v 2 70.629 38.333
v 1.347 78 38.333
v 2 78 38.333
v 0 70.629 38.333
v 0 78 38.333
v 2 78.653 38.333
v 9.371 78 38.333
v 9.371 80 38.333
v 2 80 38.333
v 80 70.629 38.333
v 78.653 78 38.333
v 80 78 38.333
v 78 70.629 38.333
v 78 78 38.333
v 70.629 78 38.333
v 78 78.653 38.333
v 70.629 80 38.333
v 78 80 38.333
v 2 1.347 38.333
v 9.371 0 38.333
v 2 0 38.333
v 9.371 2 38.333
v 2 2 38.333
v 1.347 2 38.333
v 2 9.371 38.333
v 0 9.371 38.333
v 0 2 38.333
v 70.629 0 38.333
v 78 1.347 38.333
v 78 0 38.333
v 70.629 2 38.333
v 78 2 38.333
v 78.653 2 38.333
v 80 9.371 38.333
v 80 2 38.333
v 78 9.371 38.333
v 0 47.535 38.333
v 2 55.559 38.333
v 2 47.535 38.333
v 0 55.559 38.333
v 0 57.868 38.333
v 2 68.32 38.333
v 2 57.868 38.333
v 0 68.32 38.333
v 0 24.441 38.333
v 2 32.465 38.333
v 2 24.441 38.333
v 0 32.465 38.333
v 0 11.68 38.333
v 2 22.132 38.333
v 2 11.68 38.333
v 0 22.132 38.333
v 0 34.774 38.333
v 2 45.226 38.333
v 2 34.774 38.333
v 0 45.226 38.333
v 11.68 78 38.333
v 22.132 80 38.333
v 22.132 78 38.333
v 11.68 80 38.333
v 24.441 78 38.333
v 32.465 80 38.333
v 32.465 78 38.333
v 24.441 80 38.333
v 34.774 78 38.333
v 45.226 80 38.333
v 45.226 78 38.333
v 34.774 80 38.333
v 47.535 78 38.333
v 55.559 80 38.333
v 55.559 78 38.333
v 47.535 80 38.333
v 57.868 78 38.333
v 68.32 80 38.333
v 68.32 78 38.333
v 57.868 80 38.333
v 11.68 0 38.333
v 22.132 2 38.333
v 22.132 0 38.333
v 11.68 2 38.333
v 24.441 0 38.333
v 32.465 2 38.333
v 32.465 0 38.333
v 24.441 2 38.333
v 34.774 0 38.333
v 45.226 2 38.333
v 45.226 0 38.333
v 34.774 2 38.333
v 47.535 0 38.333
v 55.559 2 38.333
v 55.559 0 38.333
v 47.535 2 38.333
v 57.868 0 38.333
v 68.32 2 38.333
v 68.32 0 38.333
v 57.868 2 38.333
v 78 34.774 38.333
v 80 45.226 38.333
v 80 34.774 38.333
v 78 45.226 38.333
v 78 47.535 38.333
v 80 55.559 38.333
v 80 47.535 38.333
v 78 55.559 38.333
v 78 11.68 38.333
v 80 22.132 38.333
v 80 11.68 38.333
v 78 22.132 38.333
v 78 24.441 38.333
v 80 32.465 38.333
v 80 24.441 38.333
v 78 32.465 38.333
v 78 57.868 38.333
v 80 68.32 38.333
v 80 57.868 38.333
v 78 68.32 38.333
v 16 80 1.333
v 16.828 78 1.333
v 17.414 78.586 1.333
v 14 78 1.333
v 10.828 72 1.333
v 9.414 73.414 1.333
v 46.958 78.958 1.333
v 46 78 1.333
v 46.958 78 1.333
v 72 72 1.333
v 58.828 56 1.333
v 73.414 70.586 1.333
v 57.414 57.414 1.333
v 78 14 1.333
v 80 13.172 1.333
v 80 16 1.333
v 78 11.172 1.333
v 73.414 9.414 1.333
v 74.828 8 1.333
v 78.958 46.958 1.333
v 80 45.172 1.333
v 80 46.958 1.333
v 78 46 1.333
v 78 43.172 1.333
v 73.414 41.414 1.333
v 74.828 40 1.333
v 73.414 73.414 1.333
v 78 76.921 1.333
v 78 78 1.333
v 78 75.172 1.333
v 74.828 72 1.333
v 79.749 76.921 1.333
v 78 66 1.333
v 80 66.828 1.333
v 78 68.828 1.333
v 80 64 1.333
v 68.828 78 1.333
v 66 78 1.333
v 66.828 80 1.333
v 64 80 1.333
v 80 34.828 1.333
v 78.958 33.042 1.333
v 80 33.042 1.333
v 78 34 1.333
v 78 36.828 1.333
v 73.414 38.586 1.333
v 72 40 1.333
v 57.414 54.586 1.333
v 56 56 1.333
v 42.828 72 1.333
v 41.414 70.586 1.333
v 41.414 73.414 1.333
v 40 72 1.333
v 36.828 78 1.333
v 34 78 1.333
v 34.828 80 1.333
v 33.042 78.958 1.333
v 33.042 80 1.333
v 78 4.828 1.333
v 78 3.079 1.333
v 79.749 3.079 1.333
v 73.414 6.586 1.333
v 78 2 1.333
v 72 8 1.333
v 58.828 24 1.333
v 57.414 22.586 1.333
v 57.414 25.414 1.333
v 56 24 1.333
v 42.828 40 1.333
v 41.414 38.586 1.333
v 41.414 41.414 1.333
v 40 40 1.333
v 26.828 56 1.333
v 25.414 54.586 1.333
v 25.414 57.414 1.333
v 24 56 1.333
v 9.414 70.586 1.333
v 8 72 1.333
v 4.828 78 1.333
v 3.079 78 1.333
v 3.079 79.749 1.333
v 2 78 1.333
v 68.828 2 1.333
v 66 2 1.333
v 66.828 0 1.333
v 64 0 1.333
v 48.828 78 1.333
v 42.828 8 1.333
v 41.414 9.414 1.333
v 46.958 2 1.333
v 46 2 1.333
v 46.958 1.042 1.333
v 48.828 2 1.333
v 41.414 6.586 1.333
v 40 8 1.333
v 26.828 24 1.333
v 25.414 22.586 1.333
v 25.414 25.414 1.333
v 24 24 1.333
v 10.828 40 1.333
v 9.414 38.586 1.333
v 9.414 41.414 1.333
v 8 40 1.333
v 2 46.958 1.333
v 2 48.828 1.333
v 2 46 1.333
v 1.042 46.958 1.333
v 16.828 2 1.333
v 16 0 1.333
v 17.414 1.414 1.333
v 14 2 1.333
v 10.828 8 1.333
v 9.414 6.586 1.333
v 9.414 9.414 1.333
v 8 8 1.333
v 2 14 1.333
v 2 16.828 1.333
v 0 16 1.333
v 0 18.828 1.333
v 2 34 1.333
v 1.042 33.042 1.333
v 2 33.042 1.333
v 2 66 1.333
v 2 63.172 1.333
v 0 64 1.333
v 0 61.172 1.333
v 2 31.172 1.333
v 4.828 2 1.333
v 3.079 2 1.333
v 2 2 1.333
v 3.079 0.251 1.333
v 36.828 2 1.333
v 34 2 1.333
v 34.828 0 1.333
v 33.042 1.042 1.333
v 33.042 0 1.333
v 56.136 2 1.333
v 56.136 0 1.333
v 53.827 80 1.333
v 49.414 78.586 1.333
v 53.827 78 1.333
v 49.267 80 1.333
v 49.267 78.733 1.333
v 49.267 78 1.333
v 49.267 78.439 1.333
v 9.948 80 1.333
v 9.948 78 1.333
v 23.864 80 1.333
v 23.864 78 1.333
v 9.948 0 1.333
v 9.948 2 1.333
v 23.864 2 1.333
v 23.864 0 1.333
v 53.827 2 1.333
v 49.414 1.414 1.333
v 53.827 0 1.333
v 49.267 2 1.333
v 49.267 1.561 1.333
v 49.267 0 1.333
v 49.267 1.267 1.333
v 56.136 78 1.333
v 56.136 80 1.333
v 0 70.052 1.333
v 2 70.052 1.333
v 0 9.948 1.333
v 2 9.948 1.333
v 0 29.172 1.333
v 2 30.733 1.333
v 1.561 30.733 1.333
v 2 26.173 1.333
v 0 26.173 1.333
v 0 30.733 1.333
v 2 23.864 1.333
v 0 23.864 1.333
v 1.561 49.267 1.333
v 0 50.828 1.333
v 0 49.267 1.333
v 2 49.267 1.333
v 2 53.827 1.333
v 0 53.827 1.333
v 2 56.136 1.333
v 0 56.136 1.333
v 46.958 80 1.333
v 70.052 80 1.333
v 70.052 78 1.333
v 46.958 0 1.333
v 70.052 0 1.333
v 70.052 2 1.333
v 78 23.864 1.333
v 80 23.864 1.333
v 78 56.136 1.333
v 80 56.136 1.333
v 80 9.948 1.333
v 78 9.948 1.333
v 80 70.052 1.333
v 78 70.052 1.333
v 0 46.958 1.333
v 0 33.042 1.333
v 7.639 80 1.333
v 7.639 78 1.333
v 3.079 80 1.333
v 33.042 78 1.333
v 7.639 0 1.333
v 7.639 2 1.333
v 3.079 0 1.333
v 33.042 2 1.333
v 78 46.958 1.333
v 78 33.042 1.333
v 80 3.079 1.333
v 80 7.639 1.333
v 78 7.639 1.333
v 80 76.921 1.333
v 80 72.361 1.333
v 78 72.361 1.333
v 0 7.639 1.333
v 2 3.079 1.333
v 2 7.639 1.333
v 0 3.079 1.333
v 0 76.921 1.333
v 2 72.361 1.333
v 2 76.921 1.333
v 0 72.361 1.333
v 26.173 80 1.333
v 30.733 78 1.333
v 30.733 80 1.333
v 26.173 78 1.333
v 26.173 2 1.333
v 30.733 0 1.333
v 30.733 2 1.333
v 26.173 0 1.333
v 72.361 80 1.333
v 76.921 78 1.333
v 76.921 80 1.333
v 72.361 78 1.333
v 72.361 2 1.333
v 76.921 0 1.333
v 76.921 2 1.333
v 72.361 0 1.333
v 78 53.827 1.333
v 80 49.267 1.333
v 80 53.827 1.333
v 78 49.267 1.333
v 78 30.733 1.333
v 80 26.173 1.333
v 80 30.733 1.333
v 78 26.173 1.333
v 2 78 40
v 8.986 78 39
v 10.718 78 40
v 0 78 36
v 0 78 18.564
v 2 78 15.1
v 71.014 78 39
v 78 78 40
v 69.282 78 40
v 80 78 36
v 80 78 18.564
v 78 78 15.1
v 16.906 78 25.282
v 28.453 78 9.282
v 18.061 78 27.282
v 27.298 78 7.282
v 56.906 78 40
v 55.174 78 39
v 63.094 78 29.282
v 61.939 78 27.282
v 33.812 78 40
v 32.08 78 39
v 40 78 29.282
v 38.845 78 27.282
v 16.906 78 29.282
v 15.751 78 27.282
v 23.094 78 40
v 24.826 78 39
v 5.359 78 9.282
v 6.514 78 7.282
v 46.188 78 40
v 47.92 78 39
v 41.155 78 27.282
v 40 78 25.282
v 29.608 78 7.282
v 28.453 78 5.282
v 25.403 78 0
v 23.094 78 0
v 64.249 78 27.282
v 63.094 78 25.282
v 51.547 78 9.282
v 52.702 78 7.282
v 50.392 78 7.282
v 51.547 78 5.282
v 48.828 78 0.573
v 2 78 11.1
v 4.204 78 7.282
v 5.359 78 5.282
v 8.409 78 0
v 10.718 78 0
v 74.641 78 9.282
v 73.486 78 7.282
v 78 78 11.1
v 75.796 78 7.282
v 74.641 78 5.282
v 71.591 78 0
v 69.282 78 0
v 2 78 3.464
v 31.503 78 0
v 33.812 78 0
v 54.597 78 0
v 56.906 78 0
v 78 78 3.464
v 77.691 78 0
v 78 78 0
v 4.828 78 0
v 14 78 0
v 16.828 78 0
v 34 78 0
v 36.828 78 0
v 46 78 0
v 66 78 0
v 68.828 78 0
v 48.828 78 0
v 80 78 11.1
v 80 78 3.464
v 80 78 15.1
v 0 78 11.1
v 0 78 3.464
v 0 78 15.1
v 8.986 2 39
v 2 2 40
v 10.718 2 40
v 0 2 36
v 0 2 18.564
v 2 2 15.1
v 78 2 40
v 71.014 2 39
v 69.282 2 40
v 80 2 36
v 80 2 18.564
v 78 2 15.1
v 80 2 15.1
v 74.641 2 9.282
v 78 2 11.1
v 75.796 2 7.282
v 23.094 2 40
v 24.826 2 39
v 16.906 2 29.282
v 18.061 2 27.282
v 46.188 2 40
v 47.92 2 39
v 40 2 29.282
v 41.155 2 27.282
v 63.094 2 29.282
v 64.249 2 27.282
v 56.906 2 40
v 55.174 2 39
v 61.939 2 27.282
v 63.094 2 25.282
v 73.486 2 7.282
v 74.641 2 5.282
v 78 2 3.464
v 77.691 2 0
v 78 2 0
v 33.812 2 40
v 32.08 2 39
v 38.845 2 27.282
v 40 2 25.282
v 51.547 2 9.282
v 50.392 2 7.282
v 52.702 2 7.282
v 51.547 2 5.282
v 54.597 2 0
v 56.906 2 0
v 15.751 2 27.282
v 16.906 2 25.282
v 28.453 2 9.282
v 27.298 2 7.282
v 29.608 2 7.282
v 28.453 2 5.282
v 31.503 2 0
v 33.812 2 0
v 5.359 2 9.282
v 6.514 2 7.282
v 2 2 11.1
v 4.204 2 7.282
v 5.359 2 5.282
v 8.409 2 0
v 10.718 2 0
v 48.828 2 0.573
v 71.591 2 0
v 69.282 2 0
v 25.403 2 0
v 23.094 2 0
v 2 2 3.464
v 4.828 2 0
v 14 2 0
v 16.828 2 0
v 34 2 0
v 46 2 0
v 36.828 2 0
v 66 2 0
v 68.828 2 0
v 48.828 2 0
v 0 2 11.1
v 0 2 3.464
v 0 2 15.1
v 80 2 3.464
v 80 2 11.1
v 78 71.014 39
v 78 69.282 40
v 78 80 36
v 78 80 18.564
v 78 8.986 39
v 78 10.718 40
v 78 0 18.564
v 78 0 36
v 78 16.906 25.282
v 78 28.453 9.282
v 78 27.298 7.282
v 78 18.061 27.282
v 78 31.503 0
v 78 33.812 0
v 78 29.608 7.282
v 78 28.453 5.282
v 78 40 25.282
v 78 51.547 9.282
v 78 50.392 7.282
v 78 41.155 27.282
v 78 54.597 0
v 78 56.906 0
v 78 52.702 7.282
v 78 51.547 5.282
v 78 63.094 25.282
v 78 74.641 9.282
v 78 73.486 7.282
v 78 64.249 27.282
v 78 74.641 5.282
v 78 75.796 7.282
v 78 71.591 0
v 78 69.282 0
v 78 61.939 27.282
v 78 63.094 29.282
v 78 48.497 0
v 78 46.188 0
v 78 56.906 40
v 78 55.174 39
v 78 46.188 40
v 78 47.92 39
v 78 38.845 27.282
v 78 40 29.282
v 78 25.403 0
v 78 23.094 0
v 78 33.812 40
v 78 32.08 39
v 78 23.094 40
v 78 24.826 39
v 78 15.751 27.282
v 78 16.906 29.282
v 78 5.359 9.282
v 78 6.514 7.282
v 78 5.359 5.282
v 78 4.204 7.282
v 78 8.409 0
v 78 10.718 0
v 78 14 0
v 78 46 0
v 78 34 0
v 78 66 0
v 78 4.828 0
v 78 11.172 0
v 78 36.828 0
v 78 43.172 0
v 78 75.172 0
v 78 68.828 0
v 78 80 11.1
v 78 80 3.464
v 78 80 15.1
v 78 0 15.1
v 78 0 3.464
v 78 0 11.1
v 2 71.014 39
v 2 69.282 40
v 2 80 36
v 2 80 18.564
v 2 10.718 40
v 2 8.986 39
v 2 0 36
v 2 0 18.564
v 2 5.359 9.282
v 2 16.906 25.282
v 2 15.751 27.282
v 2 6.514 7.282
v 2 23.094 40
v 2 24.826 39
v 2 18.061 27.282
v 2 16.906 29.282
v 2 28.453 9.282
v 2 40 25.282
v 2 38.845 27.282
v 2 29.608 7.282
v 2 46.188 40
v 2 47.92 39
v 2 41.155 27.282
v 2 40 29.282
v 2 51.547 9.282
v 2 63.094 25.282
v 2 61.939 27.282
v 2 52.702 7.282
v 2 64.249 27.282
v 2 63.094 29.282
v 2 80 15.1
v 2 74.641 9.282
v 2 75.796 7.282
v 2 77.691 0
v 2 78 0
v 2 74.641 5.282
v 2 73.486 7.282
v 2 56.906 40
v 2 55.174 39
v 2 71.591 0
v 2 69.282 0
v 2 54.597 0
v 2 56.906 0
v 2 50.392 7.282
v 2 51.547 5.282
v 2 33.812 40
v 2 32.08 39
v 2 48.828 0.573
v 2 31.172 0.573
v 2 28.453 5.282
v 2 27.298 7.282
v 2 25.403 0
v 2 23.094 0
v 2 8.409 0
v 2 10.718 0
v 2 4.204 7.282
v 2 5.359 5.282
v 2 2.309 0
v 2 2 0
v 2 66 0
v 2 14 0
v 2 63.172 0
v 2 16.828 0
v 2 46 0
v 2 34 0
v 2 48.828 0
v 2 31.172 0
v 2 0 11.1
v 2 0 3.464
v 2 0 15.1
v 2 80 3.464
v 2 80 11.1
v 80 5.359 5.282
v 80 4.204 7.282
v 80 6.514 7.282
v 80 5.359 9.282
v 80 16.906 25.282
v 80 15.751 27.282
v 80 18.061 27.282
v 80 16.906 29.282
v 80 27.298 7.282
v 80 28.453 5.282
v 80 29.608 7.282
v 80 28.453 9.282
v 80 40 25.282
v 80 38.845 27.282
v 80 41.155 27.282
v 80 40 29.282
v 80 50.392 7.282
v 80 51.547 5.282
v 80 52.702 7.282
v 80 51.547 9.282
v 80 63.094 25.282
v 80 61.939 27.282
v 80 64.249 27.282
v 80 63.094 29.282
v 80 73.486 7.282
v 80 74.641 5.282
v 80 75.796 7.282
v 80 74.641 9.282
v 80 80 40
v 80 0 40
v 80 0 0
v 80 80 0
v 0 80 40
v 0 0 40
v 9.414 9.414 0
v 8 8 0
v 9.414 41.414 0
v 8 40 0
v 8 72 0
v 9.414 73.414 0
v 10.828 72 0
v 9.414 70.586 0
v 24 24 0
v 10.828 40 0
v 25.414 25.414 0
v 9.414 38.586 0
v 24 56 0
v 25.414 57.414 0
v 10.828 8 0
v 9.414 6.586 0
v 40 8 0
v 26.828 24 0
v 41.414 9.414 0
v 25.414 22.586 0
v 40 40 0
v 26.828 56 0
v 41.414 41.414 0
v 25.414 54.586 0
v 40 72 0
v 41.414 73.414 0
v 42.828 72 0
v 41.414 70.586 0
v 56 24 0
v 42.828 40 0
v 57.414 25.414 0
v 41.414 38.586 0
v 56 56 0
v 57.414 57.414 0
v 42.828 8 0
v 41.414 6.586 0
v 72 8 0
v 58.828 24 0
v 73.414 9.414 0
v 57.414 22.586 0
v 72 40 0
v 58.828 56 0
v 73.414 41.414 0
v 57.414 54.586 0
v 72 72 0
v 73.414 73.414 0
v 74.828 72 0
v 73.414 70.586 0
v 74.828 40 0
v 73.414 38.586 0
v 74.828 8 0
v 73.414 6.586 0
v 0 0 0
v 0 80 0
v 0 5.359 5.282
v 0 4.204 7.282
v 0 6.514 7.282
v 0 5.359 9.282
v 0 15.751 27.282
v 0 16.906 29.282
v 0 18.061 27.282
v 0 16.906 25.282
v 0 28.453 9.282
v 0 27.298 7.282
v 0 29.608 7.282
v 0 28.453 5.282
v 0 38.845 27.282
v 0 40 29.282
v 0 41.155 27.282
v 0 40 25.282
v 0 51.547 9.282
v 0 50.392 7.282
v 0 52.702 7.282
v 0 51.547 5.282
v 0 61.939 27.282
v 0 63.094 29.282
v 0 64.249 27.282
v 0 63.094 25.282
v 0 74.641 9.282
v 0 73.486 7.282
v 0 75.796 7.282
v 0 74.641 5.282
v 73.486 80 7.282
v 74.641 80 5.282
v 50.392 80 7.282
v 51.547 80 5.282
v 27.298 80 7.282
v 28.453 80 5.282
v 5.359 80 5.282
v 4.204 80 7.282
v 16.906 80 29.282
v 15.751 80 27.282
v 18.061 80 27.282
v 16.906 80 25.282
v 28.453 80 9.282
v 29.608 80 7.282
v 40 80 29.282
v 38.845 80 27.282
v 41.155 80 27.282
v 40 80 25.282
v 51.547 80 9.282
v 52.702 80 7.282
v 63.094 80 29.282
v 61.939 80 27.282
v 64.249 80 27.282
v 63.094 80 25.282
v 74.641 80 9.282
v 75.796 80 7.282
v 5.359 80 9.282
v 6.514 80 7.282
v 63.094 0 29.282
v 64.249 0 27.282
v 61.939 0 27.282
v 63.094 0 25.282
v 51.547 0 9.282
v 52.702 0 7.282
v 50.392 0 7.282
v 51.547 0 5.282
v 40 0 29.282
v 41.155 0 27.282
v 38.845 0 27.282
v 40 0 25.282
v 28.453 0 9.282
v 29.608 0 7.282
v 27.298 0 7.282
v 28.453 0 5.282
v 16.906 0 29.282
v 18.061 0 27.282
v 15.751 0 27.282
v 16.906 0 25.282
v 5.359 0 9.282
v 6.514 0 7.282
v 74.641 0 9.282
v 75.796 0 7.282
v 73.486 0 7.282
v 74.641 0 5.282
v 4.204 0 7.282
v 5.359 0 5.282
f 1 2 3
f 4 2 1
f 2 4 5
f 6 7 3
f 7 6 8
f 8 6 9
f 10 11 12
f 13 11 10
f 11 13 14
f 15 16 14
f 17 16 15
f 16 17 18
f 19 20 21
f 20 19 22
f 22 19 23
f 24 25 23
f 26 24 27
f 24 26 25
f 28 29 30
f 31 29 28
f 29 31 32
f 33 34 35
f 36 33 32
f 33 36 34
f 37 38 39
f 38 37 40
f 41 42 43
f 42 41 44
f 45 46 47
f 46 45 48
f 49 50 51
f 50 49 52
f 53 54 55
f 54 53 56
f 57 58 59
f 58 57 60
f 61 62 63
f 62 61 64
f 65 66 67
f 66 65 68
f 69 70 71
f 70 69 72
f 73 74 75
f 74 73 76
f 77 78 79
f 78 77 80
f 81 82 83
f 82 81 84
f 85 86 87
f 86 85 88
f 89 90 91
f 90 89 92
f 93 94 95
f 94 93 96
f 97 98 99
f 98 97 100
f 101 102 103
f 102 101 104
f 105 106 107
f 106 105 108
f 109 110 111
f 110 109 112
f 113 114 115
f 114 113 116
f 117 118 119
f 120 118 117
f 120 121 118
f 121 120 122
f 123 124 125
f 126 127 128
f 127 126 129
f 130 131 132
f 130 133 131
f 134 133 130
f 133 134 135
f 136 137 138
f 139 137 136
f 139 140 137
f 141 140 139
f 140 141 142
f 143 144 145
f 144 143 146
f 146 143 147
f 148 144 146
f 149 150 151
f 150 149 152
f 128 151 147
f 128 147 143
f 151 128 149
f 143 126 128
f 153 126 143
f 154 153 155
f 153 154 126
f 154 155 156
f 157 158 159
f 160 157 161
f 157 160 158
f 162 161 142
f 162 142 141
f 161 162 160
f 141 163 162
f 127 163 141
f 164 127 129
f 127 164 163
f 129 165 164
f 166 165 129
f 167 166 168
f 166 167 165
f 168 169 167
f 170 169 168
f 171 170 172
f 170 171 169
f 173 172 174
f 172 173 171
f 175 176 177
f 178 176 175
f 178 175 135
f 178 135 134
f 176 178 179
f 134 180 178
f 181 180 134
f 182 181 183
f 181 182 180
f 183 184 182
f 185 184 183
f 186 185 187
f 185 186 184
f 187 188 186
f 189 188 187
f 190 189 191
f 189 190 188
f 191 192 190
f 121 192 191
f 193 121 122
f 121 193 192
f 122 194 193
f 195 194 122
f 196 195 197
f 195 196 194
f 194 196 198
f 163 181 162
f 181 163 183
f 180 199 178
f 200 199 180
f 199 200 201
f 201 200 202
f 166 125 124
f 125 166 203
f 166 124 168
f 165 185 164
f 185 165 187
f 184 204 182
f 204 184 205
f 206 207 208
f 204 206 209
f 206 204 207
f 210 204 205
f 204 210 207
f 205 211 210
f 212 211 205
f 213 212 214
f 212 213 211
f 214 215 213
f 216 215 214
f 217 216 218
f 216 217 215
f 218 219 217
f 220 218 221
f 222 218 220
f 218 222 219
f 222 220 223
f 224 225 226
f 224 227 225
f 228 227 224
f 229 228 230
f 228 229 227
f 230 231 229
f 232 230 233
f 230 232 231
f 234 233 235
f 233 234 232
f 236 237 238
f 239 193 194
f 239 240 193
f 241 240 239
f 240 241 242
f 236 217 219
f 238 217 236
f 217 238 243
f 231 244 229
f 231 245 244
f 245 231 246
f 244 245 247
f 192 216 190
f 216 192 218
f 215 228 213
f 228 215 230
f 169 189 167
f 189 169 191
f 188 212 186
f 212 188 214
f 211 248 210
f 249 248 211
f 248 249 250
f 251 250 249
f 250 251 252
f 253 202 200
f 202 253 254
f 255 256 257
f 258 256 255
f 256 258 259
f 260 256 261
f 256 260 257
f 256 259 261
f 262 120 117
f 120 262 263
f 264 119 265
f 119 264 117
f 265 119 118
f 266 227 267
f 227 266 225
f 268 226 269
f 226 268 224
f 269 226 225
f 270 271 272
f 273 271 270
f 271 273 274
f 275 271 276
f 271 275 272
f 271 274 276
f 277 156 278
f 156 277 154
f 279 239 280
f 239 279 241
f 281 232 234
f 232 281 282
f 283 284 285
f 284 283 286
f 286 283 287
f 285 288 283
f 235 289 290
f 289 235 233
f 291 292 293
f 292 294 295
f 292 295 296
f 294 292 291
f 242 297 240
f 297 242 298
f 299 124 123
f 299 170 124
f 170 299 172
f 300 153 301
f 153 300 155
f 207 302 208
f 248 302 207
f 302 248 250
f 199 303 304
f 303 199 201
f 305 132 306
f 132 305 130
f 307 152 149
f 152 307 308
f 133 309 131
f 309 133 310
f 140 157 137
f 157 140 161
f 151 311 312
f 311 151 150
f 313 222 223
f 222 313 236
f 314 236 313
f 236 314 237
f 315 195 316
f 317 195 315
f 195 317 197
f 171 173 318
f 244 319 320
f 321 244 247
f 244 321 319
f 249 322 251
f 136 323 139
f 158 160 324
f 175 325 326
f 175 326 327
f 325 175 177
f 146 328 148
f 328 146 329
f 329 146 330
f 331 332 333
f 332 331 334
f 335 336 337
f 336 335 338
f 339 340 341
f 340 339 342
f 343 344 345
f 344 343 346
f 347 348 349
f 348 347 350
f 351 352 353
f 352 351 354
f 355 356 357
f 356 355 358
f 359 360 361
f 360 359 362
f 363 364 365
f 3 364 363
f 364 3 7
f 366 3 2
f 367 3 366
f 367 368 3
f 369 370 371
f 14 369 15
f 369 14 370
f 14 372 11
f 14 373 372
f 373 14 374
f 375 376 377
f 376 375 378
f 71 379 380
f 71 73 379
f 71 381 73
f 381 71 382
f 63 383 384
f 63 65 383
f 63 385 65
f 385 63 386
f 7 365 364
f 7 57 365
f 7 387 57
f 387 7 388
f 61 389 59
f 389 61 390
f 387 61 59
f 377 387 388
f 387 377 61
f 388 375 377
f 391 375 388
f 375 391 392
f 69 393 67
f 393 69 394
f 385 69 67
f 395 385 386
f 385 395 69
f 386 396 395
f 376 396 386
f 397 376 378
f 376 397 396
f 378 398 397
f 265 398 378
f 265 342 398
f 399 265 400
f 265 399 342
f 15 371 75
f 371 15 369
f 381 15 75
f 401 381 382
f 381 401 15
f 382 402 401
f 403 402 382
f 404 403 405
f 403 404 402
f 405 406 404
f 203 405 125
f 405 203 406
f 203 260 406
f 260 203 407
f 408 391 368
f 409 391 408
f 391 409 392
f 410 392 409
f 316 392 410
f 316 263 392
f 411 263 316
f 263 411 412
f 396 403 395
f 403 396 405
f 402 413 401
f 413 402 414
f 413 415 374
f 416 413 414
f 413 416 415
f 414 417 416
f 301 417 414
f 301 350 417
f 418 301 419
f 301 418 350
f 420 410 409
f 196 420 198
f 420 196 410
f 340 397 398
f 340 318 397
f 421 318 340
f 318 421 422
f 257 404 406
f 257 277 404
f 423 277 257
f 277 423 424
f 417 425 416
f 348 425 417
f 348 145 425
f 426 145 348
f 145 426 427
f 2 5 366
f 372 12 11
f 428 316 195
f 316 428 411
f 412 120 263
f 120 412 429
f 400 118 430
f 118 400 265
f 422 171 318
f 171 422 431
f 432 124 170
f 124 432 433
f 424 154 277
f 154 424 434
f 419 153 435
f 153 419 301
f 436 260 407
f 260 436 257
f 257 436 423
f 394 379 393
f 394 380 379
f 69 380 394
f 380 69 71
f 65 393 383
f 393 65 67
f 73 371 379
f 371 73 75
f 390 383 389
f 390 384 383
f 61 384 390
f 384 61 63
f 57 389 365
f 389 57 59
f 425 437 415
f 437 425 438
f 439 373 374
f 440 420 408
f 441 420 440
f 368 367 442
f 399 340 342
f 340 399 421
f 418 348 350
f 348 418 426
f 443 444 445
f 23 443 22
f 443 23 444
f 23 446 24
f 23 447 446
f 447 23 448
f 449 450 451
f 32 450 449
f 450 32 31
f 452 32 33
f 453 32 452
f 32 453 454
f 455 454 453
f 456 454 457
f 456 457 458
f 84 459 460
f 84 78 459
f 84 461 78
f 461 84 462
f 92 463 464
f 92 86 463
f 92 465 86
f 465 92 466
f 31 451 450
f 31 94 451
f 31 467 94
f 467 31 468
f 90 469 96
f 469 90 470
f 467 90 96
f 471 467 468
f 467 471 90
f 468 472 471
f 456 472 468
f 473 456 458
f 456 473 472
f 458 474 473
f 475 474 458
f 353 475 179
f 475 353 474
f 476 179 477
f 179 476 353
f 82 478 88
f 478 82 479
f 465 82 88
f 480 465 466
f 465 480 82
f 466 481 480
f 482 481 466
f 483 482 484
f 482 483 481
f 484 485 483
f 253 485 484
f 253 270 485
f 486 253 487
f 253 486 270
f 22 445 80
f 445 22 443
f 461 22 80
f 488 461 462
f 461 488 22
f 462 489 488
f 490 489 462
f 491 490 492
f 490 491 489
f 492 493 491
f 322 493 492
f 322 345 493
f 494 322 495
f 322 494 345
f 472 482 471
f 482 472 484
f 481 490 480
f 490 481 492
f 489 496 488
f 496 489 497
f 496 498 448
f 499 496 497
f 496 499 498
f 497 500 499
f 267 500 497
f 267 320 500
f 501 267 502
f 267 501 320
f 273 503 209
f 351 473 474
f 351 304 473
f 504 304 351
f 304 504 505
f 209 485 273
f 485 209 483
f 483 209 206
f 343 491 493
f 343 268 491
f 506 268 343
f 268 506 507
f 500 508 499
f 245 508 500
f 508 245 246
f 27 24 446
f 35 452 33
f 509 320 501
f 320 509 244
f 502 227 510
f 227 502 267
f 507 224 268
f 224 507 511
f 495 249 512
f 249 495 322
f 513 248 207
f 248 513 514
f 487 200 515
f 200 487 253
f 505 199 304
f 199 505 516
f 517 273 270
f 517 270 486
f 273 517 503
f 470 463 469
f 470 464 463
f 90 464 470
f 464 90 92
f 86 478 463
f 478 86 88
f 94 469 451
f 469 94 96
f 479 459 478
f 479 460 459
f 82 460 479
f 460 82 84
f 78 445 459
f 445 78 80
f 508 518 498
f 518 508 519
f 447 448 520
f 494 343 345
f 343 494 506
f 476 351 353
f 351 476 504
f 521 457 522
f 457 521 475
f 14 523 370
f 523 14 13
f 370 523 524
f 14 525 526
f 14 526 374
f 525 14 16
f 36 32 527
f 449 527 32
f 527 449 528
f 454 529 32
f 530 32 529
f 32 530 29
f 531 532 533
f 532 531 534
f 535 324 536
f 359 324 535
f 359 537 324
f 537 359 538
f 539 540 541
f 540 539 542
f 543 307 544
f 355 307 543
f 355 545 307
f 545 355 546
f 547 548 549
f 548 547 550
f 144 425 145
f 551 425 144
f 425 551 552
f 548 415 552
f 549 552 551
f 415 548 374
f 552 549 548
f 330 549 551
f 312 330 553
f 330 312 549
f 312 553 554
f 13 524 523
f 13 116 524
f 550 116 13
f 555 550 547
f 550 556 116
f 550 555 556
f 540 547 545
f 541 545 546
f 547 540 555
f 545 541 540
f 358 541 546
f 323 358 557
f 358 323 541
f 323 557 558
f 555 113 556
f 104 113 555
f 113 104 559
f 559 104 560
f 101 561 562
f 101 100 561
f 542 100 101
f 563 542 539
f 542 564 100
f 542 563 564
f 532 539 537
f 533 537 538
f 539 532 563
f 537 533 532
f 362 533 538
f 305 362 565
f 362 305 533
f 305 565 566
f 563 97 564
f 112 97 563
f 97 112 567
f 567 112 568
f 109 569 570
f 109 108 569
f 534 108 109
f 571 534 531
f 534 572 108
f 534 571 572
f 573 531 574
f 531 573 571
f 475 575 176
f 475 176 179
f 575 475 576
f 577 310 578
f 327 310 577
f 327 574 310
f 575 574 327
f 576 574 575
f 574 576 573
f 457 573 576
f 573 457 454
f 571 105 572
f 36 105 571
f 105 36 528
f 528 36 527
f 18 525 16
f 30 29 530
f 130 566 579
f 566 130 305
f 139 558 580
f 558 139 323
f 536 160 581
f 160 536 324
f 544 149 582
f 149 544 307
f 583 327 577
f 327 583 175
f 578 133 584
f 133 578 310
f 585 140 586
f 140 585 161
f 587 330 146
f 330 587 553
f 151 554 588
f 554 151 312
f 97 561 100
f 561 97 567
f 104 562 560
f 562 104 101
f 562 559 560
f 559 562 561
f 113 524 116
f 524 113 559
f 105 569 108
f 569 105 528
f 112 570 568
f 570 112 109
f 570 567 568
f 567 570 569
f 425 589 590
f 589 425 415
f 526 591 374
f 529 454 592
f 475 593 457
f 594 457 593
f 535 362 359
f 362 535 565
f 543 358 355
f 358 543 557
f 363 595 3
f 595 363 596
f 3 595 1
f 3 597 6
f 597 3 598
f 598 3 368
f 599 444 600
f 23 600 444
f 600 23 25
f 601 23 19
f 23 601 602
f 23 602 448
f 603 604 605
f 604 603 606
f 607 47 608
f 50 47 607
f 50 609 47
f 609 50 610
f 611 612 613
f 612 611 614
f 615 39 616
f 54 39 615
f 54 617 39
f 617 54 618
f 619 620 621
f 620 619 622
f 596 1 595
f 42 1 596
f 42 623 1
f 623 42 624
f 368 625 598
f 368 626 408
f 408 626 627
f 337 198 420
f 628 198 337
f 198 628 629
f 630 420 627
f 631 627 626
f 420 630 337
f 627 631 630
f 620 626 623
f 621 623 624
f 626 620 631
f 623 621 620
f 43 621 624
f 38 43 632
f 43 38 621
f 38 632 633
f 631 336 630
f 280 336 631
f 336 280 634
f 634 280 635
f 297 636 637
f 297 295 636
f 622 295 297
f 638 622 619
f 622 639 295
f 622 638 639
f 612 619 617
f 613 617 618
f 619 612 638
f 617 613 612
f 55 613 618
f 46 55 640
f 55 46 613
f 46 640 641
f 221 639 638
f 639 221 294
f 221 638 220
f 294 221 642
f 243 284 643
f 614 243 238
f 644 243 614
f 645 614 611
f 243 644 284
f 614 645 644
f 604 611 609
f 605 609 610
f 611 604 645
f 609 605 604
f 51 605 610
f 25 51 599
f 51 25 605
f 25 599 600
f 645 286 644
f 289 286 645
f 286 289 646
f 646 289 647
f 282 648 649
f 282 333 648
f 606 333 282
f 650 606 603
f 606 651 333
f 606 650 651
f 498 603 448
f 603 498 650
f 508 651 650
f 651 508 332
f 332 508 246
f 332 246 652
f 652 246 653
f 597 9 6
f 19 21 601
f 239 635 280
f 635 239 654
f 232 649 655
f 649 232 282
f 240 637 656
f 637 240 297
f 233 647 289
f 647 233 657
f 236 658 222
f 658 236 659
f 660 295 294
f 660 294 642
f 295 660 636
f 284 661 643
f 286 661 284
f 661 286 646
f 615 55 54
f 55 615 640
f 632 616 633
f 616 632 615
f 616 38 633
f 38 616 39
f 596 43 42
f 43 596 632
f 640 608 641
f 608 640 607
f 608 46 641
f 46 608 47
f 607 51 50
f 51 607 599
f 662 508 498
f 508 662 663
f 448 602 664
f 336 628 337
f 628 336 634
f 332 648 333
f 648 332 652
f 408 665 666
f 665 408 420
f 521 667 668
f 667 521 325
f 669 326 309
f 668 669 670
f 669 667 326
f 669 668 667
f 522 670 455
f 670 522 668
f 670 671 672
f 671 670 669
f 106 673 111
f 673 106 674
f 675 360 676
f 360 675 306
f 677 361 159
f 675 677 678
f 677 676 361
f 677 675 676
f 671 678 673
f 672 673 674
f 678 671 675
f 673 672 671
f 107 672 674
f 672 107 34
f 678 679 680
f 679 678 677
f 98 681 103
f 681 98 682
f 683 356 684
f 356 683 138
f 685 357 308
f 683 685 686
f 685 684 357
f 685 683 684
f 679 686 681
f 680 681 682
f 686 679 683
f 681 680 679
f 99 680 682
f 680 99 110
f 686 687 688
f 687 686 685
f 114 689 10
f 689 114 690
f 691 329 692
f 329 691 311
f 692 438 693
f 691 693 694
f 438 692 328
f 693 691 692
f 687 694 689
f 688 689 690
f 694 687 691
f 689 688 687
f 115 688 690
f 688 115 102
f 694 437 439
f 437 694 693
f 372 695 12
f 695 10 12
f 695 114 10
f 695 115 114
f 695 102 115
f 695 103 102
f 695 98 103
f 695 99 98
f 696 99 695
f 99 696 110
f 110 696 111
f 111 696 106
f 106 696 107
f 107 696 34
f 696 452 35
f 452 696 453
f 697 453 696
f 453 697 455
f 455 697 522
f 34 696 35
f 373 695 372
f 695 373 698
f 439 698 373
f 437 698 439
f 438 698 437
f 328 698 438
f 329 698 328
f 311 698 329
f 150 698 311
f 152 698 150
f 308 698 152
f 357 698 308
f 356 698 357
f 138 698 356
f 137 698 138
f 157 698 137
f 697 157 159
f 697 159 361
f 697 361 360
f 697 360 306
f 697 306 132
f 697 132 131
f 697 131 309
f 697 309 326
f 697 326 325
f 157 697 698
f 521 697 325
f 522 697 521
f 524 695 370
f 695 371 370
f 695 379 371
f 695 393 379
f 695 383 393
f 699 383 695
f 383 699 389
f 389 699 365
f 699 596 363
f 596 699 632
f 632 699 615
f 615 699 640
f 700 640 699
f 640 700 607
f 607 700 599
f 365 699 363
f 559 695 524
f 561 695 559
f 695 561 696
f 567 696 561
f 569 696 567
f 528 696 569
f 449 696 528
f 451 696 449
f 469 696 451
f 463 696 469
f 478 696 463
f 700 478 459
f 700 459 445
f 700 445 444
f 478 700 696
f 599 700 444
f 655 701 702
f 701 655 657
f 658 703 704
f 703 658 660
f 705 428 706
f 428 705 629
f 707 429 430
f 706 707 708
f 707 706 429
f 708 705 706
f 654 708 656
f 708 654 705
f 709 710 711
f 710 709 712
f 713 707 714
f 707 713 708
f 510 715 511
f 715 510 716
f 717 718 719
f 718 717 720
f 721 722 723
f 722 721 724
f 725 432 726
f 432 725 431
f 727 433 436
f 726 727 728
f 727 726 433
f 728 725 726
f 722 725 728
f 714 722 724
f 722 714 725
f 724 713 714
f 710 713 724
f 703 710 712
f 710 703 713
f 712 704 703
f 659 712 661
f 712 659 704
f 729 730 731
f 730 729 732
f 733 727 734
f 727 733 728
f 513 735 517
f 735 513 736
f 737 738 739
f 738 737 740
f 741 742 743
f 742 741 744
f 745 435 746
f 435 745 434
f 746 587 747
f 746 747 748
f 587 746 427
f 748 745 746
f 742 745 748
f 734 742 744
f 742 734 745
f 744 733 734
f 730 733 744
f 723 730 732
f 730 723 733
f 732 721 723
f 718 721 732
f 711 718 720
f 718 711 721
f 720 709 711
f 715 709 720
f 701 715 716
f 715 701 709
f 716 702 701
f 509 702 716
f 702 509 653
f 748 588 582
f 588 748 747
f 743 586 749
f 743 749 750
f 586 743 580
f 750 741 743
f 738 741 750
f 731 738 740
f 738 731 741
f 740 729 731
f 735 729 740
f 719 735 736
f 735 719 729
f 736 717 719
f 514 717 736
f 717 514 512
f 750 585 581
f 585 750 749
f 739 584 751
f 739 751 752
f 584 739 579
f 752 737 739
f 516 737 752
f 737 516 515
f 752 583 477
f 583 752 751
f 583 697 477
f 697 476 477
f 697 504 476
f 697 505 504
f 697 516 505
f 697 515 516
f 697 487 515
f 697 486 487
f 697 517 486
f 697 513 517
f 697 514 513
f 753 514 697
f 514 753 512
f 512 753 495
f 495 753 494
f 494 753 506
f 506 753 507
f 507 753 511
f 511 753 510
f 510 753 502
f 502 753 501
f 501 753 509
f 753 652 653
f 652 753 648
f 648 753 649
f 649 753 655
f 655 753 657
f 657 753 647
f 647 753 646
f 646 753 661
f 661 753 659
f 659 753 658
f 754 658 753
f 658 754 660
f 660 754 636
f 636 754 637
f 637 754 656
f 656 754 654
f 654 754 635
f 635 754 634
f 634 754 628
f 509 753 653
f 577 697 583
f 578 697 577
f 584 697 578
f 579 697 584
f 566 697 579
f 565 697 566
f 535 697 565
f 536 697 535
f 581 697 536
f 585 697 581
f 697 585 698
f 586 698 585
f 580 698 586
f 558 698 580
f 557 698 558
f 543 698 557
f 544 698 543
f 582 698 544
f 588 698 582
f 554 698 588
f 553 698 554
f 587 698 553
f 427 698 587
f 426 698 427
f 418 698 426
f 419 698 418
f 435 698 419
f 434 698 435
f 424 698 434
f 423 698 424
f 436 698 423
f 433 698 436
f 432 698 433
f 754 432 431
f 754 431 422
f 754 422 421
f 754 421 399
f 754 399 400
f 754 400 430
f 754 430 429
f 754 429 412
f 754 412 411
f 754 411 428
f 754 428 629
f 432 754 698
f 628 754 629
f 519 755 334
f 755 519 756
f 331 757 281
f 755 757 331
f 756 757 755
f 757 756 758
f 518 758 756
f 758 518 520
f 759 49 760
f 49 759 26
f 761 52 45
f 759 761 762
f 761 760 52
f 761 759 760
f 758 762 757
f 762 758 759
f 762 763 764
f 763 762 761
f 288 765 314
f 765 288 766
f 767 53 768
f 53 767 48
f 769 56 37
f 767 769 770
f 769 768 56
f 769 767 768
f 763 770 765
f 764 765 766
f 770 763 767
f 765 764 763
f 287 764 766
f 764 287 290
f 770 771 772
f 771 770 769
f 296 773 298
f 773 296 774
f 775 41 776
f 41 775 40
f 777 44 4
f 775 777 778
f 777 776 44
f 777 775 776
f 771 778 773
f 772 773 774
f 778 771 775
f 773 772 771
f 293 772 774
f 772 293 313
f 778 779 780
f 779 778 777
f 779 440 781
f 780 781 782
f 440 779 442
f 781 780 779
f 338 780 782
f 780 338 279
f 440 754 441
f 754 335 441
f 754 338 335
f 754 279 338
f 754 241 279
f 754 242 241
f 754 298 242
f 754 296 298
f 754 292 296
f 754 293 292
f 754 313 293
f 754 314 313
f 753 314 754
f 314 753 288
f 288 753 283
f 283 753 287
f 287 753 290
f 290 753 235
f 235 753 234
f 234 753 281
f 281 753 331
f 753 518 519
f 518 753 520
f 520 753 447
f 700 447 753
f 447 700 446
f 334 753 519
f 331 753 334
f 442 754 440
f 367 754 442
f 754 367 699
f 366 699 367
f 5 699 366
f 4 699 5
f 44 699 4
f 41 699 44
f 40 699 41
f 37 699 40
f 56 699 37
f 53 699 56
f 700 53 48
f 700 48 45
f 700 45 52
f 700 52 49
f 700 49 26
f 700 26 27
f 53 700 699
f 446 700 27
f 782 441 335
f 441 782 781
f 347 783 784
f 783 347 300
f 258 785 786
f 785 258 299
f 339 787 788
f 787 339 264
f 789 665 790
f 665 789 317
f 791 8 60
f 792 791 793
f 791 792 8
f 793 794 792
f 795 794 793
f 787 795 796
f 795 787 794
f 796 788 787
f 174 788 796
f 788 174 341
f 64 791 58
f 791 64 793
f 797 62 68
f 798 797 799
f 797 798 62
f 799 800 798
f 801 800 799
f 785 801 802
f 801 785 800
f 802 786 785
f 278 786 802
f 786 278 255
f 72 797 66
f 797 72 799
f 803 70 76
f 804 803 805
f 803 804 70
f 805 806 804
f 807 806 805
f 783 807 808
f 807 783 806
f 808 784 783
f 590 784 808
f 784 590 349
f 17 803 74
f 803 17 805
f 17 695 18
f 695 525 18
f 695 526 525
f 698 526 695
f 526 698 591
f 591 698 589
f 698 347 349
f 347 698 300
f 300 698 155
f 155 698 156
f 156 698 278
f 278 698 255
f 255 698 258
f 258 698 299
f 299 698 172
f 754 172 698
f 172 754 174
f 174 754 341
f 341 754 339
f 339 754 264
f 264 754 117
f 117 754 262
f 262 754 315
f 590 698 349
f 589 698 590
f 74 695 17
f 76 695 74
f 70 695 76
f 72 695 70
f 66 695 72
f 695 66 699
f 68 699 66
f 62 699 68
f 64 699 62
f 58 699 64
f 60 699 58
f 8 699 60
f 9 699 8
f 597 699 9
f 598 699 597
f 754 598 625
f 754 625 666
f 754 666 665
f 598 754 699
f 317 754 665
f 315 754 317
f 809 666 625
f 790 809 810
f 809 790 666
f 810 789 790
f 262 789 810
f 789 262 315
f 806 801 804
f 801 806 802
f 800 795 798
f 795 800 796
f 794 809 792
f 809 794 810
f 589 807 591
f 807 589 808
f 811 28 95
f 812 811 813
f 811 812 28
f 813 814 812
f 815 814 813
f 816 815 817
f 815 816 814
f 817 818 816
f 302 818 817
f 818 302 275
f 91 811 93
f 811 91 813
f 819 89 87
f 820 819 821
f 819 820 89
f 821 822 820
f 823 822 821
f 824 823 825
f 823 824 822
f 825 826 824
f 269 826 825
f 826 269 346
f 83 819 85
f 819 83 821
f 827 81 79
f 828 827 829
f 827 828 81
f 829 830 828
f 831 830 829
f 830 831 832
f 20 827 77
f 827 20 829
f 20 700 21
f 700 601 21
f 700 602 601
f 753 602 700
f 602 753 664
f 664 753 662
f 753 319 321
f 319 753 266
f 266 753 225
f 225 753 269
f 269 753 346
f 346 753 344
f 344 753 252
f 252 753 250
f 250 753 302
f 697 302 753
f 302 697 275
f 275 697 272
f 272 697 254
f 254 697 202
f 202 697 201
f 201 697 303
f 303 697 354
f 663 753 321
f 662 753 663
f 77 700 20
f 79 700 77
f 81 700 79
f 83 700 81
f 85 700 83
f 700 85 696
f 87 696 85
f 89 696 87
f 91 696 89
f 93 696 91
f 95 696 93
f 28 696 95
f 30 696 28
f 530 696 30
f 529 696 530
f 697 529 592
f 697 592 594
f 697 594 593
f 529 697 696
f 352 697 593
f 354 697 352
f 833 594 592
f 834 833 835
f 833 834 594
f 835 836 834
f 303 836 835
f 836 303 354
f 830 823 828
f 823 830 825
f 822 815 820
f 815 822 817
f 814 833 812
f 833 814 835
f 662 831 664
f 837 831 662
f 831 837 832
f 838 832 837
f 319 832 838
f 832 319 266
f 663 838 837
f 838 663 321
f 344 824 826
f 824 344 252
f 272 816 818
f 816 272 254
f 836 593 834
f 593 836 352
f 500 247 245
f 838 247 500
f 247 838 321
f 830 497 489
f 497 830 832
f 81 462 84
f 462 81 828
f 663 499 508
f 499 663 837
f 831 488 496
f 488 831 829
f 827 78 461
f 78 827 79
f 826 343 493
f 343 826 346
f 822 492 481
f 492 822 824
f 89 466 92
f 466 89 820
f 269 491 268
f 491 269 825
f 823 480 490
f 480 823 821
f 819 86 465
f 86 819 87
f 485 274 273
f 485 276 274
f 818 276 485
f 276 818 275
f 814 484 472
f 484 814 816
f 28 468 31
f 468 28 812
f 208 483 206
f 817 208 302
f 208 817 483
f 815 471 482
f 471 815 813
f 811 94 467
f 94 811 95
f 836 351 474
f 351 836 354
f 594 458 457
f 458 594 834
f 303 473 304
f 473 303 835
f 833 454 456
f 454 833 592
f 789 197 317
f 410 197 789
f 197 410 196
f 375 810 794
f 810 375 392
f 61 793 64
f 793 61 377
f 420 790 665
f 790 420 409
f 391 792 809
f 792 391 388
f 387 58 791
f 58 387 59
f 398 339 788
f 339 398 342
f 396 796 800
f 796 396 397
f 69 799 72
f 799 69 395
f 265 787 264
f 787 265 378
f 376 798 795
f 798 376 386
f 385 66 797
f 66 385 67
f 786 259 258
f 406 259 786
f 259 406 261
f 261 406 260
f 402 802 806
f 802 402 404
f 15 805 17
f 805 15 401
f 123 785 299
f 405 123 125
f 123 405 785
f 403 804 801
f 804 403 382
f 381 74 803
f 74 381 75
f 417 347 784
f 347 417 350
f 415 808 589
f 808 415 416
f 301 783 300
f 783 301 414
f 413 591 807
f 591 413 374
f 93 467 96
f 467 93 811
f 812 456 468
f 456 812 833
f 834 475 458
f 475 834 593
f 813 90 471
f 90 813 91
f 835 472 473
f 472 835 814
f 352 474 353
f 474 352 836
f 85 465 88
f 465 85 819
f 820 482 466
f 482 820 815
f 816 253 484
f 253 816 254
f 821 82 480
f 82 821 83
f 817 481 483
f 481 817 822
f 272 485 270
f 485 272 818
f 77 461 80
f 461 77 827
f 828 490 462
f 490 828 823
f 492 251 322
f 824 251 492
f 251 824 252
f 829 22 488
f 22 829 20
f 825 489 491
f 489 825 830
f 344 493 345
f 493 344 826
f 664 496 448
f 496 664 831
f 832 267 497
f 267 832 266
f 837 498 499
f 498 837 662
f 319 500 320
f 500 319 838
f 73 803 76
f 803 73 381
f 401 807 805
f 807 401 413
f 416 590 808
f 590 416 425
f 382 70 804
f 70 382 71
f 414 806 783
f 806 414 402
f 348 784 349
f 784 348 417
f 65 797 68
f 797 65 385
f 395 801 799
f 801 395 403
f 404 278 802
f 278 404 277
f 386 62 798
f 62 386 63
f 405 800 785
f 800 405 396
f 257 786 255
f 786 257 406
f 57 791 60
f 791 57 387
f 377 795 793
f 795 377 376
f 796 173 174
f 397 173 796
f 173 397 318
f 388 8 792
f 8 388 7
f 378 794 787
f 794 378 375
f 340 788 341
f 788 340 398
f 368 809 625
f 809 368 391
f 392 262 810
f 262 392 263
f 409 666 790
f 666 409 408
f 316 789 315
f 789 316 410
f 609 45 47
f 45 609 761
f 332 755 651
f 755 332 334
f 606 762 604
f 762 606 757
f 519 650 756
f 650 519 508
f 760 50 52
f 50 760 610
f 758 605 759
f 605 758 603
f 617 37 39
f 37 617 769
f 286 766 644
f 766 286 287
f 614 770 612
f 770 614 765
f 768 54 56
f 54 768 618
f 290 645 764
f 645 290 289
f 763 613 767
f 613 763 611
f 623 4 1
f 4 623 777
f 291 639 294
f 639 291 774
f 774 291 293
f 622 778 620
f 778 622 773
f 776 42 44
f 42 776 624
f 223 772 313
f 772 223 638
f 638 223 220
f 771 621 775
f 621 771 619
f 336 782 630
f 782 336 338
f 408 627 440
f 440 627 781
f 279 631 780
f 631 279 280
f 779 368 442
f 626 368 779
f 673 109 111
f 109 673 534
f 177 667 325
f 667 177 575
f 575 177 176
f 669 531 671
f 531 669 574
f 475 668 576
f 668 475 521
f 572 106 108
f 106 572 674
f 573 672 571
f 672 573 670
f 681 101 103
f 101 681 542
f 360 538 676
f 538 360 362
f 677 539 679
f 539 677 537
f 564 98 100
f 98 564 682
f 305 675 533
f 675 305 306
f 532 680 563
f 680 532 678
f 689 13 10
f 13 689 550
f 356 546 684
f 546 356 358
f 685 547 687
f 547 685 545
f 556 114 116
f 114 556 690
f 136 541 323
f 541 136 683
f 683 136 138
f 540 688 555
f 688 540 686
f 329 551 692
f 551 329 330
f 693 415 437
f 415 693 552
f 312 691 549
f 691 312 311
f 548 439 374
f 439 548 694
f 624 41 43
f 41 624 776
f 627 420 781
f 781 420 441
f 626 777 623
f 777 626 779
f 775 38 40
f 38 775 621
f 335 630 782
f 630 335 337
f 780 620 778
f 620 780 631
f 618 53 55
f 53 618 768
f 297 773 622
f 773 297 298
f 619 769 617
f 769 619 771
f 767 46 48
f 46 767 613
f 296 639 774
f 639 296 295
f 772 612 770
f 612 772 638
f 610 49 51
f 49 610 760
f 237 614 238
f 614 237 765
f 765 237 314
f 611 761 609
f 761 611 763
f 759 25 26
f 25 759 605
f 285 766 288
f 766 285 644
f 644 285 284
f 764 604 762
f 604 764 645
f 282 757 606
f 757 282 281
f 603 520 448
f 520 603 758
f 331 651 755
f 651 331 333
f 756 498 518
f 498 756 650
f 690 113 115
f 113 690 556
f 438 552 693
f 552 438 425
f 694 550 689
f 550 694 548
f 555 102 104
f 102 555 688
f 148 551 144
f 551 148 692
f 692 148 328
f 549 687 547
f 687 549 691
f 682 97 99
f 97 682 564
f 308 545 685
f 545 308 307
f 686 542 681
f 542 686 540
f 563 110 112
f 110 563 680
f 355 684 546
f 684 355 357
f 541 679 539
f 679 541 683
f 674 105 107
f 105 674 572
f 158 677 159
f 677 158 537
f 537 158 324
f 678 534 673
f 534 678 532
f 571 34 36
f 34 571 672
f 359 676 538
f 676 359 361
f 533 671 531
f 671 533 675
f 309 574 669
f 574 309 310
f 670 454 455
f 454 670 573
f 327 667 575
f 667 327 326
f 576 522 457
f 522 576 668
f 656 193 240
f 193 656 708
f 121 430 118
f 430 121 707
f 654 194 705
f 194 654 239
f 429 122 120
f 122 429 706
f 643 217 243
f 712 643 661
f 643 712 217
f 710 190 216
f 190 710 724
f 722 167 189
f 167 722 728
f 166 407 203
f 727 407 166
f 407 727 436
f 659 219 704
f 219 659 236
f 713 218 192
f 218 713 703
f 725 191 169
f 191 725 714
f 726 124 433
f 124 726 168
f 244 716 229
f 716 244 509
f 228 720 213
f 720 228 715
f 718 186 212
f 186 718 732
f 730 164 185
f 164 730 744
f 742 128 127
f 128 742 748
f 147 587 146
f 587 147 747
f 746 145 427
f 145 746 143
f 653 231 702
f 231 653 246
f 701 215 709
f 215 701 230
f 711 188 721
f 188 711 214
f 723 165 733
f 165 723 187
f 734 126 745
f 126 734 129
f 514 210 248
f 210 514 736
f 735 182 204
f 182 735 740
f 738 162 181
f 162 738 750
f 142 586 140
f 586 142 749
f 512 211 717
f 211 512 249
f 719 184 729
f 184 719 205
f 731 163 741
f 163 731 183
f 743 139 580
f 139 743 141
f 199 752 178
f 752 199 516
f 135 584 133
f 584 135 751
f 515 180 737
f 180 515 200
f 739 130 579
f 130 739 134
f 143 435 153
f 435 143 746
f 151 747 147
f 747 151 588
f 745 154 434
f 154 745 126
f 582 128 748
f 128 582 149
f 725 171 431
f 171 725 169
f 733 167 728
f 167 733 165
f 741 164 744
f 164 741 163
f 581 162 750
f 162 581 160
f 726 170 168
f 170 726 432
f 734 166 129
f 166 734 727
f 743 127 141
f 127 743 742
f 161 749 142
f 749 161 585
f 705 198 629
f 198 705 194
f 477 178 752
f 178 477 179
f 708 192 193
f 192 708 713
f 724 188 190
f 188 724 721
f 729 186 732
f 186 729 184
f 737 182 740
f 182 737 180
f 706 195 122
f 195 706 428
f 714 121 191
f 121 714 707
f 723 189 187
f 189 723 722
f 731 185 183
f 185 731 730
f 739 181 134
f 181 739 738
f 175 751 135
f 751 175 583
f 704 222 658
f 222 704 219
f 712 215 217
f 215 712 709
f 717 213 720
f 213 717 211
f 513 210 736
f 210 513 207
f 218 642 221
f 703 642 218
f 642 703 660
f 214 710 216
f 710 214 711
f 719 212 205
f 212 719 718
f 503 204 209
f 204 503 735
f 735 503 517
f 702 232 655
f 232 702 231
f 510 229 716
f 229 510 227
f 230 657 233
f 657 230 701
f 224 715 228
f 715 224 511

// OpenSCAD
/*
 * by Luke Crevier 
 * version v0.1
 * This work is licensed under the Creative Commons - Attribution - Non-Commercial ShareAlike license.
 * https://creativecommons.org/licenses/by-nc-sa/3.0/
 */


 // Parameter Section //
//-------------------//

// Length
l = 80;

// Width
w = 80;

// Height
h = 40;

// Thickness of bars
barDiam = 2;

// Wall bar multiplier
wallCoef = 1;

// Angle of the floor bars
floorAngle = 45;

// Floor multiplier
floorCoef = 2.5;

// Boolean to chamfer the corner posts
chamferCorners = false;

/* [Hidden] */

module cross(basewid, h_) {
    rotate([0,30,0])
    cube([barDiam,barDiam, (h_ / sin(60))]);
}

module wall(length, wid, h_, wallCoef = 1) {
    segment = tan(30) * h_;
    segMult = segment * 5;
    wallSegments = [ for(i = [0 - segMult : segment / wallCoef  : length]) i];
    for(i = [0, wid - barDiam]){
        for(j = wallSegments) {
            translate([j,i,])
            cross(segment, h_);
        }
    }
    oppSegments = [ for(i = [length + segMult : -segment / wallCoef : 0]) i];
    for(i = [0, wid - barDiam]){
        for(j = oppSegments) {
            translate([j,i,])
            mirror([180,0,0])
            cross(segment, h_);
        }
    }
}
module floor(ang = 30, scaler = 2) {
    segment = tan(ang) * w ; 
    seg3 = 2 * segment;
    floorSegments = [ for(i = [0 - seg3 : segment / scaler : l]) i];
    oppSegments = [ for(i = [l + seg3: -segment / scaler : 0]) i];
    for(i = floorSegments) {
        translate([i,0,0]){
            rotate([0,0,-ang])
            cube([barDiam, segment / sin(ang), barDiam/1.5]);
        }
    }


    for(i = oppSegments) {
        translate([i,0,0]){
            rotate([0,0,ang])
            cube([barDiam, segment / sin(ang), barDiam/1.5]);
        }
    }
}


module skeleton() {
    wall(l,w, h, wallCoef);
    rotate([0,0,90])
    mirror([0,180,0])
    wall(w,l, h, wallCoef);
}

module edges(length, width, height){
    difference() {
        cube([l,w,h]);  
        union() {
            translate([-l/2,barDiam,barDiam/1.5])
            cube([l* 2, w-barDiam*2, h-barDiam*1.5]);
            translate([barDiam, -w/2, barDiam/1.5])
            cube([l-barDiam*2, w*2, h-barDiam*1.5]);
            translate([barDiam, barDiam, -1/2 * h])
            cube([l-barDiam*2, w-barDiam*2, h*2]);
            
        }
    }
}

difference(){
    union() { 
        edges();
        intersection() {
            skeleton();
            cube([l,w,h]);        
        }
        intersection() {
            cube([l,w,h]);
            floor(floorAngle, floorCoef);
            
        }
    }
    if (chamferCorners == true) {
        chamferEdges();
    }
}

module chamferEdges () {
    for(i = [0, l + barDiam*1.8]){
        for(j = [0,w + barDiam*1.8]){
            echo(i);
            echo(j);
            translate([i-barDiam,j-barDiam,-1]){
                rotate([0,0,45])
                translate([-barDiam*2,-barDiam*2,0])
                cube([barDiam*4,barDiam*4,h+2]);
            }
        }
    }
}
